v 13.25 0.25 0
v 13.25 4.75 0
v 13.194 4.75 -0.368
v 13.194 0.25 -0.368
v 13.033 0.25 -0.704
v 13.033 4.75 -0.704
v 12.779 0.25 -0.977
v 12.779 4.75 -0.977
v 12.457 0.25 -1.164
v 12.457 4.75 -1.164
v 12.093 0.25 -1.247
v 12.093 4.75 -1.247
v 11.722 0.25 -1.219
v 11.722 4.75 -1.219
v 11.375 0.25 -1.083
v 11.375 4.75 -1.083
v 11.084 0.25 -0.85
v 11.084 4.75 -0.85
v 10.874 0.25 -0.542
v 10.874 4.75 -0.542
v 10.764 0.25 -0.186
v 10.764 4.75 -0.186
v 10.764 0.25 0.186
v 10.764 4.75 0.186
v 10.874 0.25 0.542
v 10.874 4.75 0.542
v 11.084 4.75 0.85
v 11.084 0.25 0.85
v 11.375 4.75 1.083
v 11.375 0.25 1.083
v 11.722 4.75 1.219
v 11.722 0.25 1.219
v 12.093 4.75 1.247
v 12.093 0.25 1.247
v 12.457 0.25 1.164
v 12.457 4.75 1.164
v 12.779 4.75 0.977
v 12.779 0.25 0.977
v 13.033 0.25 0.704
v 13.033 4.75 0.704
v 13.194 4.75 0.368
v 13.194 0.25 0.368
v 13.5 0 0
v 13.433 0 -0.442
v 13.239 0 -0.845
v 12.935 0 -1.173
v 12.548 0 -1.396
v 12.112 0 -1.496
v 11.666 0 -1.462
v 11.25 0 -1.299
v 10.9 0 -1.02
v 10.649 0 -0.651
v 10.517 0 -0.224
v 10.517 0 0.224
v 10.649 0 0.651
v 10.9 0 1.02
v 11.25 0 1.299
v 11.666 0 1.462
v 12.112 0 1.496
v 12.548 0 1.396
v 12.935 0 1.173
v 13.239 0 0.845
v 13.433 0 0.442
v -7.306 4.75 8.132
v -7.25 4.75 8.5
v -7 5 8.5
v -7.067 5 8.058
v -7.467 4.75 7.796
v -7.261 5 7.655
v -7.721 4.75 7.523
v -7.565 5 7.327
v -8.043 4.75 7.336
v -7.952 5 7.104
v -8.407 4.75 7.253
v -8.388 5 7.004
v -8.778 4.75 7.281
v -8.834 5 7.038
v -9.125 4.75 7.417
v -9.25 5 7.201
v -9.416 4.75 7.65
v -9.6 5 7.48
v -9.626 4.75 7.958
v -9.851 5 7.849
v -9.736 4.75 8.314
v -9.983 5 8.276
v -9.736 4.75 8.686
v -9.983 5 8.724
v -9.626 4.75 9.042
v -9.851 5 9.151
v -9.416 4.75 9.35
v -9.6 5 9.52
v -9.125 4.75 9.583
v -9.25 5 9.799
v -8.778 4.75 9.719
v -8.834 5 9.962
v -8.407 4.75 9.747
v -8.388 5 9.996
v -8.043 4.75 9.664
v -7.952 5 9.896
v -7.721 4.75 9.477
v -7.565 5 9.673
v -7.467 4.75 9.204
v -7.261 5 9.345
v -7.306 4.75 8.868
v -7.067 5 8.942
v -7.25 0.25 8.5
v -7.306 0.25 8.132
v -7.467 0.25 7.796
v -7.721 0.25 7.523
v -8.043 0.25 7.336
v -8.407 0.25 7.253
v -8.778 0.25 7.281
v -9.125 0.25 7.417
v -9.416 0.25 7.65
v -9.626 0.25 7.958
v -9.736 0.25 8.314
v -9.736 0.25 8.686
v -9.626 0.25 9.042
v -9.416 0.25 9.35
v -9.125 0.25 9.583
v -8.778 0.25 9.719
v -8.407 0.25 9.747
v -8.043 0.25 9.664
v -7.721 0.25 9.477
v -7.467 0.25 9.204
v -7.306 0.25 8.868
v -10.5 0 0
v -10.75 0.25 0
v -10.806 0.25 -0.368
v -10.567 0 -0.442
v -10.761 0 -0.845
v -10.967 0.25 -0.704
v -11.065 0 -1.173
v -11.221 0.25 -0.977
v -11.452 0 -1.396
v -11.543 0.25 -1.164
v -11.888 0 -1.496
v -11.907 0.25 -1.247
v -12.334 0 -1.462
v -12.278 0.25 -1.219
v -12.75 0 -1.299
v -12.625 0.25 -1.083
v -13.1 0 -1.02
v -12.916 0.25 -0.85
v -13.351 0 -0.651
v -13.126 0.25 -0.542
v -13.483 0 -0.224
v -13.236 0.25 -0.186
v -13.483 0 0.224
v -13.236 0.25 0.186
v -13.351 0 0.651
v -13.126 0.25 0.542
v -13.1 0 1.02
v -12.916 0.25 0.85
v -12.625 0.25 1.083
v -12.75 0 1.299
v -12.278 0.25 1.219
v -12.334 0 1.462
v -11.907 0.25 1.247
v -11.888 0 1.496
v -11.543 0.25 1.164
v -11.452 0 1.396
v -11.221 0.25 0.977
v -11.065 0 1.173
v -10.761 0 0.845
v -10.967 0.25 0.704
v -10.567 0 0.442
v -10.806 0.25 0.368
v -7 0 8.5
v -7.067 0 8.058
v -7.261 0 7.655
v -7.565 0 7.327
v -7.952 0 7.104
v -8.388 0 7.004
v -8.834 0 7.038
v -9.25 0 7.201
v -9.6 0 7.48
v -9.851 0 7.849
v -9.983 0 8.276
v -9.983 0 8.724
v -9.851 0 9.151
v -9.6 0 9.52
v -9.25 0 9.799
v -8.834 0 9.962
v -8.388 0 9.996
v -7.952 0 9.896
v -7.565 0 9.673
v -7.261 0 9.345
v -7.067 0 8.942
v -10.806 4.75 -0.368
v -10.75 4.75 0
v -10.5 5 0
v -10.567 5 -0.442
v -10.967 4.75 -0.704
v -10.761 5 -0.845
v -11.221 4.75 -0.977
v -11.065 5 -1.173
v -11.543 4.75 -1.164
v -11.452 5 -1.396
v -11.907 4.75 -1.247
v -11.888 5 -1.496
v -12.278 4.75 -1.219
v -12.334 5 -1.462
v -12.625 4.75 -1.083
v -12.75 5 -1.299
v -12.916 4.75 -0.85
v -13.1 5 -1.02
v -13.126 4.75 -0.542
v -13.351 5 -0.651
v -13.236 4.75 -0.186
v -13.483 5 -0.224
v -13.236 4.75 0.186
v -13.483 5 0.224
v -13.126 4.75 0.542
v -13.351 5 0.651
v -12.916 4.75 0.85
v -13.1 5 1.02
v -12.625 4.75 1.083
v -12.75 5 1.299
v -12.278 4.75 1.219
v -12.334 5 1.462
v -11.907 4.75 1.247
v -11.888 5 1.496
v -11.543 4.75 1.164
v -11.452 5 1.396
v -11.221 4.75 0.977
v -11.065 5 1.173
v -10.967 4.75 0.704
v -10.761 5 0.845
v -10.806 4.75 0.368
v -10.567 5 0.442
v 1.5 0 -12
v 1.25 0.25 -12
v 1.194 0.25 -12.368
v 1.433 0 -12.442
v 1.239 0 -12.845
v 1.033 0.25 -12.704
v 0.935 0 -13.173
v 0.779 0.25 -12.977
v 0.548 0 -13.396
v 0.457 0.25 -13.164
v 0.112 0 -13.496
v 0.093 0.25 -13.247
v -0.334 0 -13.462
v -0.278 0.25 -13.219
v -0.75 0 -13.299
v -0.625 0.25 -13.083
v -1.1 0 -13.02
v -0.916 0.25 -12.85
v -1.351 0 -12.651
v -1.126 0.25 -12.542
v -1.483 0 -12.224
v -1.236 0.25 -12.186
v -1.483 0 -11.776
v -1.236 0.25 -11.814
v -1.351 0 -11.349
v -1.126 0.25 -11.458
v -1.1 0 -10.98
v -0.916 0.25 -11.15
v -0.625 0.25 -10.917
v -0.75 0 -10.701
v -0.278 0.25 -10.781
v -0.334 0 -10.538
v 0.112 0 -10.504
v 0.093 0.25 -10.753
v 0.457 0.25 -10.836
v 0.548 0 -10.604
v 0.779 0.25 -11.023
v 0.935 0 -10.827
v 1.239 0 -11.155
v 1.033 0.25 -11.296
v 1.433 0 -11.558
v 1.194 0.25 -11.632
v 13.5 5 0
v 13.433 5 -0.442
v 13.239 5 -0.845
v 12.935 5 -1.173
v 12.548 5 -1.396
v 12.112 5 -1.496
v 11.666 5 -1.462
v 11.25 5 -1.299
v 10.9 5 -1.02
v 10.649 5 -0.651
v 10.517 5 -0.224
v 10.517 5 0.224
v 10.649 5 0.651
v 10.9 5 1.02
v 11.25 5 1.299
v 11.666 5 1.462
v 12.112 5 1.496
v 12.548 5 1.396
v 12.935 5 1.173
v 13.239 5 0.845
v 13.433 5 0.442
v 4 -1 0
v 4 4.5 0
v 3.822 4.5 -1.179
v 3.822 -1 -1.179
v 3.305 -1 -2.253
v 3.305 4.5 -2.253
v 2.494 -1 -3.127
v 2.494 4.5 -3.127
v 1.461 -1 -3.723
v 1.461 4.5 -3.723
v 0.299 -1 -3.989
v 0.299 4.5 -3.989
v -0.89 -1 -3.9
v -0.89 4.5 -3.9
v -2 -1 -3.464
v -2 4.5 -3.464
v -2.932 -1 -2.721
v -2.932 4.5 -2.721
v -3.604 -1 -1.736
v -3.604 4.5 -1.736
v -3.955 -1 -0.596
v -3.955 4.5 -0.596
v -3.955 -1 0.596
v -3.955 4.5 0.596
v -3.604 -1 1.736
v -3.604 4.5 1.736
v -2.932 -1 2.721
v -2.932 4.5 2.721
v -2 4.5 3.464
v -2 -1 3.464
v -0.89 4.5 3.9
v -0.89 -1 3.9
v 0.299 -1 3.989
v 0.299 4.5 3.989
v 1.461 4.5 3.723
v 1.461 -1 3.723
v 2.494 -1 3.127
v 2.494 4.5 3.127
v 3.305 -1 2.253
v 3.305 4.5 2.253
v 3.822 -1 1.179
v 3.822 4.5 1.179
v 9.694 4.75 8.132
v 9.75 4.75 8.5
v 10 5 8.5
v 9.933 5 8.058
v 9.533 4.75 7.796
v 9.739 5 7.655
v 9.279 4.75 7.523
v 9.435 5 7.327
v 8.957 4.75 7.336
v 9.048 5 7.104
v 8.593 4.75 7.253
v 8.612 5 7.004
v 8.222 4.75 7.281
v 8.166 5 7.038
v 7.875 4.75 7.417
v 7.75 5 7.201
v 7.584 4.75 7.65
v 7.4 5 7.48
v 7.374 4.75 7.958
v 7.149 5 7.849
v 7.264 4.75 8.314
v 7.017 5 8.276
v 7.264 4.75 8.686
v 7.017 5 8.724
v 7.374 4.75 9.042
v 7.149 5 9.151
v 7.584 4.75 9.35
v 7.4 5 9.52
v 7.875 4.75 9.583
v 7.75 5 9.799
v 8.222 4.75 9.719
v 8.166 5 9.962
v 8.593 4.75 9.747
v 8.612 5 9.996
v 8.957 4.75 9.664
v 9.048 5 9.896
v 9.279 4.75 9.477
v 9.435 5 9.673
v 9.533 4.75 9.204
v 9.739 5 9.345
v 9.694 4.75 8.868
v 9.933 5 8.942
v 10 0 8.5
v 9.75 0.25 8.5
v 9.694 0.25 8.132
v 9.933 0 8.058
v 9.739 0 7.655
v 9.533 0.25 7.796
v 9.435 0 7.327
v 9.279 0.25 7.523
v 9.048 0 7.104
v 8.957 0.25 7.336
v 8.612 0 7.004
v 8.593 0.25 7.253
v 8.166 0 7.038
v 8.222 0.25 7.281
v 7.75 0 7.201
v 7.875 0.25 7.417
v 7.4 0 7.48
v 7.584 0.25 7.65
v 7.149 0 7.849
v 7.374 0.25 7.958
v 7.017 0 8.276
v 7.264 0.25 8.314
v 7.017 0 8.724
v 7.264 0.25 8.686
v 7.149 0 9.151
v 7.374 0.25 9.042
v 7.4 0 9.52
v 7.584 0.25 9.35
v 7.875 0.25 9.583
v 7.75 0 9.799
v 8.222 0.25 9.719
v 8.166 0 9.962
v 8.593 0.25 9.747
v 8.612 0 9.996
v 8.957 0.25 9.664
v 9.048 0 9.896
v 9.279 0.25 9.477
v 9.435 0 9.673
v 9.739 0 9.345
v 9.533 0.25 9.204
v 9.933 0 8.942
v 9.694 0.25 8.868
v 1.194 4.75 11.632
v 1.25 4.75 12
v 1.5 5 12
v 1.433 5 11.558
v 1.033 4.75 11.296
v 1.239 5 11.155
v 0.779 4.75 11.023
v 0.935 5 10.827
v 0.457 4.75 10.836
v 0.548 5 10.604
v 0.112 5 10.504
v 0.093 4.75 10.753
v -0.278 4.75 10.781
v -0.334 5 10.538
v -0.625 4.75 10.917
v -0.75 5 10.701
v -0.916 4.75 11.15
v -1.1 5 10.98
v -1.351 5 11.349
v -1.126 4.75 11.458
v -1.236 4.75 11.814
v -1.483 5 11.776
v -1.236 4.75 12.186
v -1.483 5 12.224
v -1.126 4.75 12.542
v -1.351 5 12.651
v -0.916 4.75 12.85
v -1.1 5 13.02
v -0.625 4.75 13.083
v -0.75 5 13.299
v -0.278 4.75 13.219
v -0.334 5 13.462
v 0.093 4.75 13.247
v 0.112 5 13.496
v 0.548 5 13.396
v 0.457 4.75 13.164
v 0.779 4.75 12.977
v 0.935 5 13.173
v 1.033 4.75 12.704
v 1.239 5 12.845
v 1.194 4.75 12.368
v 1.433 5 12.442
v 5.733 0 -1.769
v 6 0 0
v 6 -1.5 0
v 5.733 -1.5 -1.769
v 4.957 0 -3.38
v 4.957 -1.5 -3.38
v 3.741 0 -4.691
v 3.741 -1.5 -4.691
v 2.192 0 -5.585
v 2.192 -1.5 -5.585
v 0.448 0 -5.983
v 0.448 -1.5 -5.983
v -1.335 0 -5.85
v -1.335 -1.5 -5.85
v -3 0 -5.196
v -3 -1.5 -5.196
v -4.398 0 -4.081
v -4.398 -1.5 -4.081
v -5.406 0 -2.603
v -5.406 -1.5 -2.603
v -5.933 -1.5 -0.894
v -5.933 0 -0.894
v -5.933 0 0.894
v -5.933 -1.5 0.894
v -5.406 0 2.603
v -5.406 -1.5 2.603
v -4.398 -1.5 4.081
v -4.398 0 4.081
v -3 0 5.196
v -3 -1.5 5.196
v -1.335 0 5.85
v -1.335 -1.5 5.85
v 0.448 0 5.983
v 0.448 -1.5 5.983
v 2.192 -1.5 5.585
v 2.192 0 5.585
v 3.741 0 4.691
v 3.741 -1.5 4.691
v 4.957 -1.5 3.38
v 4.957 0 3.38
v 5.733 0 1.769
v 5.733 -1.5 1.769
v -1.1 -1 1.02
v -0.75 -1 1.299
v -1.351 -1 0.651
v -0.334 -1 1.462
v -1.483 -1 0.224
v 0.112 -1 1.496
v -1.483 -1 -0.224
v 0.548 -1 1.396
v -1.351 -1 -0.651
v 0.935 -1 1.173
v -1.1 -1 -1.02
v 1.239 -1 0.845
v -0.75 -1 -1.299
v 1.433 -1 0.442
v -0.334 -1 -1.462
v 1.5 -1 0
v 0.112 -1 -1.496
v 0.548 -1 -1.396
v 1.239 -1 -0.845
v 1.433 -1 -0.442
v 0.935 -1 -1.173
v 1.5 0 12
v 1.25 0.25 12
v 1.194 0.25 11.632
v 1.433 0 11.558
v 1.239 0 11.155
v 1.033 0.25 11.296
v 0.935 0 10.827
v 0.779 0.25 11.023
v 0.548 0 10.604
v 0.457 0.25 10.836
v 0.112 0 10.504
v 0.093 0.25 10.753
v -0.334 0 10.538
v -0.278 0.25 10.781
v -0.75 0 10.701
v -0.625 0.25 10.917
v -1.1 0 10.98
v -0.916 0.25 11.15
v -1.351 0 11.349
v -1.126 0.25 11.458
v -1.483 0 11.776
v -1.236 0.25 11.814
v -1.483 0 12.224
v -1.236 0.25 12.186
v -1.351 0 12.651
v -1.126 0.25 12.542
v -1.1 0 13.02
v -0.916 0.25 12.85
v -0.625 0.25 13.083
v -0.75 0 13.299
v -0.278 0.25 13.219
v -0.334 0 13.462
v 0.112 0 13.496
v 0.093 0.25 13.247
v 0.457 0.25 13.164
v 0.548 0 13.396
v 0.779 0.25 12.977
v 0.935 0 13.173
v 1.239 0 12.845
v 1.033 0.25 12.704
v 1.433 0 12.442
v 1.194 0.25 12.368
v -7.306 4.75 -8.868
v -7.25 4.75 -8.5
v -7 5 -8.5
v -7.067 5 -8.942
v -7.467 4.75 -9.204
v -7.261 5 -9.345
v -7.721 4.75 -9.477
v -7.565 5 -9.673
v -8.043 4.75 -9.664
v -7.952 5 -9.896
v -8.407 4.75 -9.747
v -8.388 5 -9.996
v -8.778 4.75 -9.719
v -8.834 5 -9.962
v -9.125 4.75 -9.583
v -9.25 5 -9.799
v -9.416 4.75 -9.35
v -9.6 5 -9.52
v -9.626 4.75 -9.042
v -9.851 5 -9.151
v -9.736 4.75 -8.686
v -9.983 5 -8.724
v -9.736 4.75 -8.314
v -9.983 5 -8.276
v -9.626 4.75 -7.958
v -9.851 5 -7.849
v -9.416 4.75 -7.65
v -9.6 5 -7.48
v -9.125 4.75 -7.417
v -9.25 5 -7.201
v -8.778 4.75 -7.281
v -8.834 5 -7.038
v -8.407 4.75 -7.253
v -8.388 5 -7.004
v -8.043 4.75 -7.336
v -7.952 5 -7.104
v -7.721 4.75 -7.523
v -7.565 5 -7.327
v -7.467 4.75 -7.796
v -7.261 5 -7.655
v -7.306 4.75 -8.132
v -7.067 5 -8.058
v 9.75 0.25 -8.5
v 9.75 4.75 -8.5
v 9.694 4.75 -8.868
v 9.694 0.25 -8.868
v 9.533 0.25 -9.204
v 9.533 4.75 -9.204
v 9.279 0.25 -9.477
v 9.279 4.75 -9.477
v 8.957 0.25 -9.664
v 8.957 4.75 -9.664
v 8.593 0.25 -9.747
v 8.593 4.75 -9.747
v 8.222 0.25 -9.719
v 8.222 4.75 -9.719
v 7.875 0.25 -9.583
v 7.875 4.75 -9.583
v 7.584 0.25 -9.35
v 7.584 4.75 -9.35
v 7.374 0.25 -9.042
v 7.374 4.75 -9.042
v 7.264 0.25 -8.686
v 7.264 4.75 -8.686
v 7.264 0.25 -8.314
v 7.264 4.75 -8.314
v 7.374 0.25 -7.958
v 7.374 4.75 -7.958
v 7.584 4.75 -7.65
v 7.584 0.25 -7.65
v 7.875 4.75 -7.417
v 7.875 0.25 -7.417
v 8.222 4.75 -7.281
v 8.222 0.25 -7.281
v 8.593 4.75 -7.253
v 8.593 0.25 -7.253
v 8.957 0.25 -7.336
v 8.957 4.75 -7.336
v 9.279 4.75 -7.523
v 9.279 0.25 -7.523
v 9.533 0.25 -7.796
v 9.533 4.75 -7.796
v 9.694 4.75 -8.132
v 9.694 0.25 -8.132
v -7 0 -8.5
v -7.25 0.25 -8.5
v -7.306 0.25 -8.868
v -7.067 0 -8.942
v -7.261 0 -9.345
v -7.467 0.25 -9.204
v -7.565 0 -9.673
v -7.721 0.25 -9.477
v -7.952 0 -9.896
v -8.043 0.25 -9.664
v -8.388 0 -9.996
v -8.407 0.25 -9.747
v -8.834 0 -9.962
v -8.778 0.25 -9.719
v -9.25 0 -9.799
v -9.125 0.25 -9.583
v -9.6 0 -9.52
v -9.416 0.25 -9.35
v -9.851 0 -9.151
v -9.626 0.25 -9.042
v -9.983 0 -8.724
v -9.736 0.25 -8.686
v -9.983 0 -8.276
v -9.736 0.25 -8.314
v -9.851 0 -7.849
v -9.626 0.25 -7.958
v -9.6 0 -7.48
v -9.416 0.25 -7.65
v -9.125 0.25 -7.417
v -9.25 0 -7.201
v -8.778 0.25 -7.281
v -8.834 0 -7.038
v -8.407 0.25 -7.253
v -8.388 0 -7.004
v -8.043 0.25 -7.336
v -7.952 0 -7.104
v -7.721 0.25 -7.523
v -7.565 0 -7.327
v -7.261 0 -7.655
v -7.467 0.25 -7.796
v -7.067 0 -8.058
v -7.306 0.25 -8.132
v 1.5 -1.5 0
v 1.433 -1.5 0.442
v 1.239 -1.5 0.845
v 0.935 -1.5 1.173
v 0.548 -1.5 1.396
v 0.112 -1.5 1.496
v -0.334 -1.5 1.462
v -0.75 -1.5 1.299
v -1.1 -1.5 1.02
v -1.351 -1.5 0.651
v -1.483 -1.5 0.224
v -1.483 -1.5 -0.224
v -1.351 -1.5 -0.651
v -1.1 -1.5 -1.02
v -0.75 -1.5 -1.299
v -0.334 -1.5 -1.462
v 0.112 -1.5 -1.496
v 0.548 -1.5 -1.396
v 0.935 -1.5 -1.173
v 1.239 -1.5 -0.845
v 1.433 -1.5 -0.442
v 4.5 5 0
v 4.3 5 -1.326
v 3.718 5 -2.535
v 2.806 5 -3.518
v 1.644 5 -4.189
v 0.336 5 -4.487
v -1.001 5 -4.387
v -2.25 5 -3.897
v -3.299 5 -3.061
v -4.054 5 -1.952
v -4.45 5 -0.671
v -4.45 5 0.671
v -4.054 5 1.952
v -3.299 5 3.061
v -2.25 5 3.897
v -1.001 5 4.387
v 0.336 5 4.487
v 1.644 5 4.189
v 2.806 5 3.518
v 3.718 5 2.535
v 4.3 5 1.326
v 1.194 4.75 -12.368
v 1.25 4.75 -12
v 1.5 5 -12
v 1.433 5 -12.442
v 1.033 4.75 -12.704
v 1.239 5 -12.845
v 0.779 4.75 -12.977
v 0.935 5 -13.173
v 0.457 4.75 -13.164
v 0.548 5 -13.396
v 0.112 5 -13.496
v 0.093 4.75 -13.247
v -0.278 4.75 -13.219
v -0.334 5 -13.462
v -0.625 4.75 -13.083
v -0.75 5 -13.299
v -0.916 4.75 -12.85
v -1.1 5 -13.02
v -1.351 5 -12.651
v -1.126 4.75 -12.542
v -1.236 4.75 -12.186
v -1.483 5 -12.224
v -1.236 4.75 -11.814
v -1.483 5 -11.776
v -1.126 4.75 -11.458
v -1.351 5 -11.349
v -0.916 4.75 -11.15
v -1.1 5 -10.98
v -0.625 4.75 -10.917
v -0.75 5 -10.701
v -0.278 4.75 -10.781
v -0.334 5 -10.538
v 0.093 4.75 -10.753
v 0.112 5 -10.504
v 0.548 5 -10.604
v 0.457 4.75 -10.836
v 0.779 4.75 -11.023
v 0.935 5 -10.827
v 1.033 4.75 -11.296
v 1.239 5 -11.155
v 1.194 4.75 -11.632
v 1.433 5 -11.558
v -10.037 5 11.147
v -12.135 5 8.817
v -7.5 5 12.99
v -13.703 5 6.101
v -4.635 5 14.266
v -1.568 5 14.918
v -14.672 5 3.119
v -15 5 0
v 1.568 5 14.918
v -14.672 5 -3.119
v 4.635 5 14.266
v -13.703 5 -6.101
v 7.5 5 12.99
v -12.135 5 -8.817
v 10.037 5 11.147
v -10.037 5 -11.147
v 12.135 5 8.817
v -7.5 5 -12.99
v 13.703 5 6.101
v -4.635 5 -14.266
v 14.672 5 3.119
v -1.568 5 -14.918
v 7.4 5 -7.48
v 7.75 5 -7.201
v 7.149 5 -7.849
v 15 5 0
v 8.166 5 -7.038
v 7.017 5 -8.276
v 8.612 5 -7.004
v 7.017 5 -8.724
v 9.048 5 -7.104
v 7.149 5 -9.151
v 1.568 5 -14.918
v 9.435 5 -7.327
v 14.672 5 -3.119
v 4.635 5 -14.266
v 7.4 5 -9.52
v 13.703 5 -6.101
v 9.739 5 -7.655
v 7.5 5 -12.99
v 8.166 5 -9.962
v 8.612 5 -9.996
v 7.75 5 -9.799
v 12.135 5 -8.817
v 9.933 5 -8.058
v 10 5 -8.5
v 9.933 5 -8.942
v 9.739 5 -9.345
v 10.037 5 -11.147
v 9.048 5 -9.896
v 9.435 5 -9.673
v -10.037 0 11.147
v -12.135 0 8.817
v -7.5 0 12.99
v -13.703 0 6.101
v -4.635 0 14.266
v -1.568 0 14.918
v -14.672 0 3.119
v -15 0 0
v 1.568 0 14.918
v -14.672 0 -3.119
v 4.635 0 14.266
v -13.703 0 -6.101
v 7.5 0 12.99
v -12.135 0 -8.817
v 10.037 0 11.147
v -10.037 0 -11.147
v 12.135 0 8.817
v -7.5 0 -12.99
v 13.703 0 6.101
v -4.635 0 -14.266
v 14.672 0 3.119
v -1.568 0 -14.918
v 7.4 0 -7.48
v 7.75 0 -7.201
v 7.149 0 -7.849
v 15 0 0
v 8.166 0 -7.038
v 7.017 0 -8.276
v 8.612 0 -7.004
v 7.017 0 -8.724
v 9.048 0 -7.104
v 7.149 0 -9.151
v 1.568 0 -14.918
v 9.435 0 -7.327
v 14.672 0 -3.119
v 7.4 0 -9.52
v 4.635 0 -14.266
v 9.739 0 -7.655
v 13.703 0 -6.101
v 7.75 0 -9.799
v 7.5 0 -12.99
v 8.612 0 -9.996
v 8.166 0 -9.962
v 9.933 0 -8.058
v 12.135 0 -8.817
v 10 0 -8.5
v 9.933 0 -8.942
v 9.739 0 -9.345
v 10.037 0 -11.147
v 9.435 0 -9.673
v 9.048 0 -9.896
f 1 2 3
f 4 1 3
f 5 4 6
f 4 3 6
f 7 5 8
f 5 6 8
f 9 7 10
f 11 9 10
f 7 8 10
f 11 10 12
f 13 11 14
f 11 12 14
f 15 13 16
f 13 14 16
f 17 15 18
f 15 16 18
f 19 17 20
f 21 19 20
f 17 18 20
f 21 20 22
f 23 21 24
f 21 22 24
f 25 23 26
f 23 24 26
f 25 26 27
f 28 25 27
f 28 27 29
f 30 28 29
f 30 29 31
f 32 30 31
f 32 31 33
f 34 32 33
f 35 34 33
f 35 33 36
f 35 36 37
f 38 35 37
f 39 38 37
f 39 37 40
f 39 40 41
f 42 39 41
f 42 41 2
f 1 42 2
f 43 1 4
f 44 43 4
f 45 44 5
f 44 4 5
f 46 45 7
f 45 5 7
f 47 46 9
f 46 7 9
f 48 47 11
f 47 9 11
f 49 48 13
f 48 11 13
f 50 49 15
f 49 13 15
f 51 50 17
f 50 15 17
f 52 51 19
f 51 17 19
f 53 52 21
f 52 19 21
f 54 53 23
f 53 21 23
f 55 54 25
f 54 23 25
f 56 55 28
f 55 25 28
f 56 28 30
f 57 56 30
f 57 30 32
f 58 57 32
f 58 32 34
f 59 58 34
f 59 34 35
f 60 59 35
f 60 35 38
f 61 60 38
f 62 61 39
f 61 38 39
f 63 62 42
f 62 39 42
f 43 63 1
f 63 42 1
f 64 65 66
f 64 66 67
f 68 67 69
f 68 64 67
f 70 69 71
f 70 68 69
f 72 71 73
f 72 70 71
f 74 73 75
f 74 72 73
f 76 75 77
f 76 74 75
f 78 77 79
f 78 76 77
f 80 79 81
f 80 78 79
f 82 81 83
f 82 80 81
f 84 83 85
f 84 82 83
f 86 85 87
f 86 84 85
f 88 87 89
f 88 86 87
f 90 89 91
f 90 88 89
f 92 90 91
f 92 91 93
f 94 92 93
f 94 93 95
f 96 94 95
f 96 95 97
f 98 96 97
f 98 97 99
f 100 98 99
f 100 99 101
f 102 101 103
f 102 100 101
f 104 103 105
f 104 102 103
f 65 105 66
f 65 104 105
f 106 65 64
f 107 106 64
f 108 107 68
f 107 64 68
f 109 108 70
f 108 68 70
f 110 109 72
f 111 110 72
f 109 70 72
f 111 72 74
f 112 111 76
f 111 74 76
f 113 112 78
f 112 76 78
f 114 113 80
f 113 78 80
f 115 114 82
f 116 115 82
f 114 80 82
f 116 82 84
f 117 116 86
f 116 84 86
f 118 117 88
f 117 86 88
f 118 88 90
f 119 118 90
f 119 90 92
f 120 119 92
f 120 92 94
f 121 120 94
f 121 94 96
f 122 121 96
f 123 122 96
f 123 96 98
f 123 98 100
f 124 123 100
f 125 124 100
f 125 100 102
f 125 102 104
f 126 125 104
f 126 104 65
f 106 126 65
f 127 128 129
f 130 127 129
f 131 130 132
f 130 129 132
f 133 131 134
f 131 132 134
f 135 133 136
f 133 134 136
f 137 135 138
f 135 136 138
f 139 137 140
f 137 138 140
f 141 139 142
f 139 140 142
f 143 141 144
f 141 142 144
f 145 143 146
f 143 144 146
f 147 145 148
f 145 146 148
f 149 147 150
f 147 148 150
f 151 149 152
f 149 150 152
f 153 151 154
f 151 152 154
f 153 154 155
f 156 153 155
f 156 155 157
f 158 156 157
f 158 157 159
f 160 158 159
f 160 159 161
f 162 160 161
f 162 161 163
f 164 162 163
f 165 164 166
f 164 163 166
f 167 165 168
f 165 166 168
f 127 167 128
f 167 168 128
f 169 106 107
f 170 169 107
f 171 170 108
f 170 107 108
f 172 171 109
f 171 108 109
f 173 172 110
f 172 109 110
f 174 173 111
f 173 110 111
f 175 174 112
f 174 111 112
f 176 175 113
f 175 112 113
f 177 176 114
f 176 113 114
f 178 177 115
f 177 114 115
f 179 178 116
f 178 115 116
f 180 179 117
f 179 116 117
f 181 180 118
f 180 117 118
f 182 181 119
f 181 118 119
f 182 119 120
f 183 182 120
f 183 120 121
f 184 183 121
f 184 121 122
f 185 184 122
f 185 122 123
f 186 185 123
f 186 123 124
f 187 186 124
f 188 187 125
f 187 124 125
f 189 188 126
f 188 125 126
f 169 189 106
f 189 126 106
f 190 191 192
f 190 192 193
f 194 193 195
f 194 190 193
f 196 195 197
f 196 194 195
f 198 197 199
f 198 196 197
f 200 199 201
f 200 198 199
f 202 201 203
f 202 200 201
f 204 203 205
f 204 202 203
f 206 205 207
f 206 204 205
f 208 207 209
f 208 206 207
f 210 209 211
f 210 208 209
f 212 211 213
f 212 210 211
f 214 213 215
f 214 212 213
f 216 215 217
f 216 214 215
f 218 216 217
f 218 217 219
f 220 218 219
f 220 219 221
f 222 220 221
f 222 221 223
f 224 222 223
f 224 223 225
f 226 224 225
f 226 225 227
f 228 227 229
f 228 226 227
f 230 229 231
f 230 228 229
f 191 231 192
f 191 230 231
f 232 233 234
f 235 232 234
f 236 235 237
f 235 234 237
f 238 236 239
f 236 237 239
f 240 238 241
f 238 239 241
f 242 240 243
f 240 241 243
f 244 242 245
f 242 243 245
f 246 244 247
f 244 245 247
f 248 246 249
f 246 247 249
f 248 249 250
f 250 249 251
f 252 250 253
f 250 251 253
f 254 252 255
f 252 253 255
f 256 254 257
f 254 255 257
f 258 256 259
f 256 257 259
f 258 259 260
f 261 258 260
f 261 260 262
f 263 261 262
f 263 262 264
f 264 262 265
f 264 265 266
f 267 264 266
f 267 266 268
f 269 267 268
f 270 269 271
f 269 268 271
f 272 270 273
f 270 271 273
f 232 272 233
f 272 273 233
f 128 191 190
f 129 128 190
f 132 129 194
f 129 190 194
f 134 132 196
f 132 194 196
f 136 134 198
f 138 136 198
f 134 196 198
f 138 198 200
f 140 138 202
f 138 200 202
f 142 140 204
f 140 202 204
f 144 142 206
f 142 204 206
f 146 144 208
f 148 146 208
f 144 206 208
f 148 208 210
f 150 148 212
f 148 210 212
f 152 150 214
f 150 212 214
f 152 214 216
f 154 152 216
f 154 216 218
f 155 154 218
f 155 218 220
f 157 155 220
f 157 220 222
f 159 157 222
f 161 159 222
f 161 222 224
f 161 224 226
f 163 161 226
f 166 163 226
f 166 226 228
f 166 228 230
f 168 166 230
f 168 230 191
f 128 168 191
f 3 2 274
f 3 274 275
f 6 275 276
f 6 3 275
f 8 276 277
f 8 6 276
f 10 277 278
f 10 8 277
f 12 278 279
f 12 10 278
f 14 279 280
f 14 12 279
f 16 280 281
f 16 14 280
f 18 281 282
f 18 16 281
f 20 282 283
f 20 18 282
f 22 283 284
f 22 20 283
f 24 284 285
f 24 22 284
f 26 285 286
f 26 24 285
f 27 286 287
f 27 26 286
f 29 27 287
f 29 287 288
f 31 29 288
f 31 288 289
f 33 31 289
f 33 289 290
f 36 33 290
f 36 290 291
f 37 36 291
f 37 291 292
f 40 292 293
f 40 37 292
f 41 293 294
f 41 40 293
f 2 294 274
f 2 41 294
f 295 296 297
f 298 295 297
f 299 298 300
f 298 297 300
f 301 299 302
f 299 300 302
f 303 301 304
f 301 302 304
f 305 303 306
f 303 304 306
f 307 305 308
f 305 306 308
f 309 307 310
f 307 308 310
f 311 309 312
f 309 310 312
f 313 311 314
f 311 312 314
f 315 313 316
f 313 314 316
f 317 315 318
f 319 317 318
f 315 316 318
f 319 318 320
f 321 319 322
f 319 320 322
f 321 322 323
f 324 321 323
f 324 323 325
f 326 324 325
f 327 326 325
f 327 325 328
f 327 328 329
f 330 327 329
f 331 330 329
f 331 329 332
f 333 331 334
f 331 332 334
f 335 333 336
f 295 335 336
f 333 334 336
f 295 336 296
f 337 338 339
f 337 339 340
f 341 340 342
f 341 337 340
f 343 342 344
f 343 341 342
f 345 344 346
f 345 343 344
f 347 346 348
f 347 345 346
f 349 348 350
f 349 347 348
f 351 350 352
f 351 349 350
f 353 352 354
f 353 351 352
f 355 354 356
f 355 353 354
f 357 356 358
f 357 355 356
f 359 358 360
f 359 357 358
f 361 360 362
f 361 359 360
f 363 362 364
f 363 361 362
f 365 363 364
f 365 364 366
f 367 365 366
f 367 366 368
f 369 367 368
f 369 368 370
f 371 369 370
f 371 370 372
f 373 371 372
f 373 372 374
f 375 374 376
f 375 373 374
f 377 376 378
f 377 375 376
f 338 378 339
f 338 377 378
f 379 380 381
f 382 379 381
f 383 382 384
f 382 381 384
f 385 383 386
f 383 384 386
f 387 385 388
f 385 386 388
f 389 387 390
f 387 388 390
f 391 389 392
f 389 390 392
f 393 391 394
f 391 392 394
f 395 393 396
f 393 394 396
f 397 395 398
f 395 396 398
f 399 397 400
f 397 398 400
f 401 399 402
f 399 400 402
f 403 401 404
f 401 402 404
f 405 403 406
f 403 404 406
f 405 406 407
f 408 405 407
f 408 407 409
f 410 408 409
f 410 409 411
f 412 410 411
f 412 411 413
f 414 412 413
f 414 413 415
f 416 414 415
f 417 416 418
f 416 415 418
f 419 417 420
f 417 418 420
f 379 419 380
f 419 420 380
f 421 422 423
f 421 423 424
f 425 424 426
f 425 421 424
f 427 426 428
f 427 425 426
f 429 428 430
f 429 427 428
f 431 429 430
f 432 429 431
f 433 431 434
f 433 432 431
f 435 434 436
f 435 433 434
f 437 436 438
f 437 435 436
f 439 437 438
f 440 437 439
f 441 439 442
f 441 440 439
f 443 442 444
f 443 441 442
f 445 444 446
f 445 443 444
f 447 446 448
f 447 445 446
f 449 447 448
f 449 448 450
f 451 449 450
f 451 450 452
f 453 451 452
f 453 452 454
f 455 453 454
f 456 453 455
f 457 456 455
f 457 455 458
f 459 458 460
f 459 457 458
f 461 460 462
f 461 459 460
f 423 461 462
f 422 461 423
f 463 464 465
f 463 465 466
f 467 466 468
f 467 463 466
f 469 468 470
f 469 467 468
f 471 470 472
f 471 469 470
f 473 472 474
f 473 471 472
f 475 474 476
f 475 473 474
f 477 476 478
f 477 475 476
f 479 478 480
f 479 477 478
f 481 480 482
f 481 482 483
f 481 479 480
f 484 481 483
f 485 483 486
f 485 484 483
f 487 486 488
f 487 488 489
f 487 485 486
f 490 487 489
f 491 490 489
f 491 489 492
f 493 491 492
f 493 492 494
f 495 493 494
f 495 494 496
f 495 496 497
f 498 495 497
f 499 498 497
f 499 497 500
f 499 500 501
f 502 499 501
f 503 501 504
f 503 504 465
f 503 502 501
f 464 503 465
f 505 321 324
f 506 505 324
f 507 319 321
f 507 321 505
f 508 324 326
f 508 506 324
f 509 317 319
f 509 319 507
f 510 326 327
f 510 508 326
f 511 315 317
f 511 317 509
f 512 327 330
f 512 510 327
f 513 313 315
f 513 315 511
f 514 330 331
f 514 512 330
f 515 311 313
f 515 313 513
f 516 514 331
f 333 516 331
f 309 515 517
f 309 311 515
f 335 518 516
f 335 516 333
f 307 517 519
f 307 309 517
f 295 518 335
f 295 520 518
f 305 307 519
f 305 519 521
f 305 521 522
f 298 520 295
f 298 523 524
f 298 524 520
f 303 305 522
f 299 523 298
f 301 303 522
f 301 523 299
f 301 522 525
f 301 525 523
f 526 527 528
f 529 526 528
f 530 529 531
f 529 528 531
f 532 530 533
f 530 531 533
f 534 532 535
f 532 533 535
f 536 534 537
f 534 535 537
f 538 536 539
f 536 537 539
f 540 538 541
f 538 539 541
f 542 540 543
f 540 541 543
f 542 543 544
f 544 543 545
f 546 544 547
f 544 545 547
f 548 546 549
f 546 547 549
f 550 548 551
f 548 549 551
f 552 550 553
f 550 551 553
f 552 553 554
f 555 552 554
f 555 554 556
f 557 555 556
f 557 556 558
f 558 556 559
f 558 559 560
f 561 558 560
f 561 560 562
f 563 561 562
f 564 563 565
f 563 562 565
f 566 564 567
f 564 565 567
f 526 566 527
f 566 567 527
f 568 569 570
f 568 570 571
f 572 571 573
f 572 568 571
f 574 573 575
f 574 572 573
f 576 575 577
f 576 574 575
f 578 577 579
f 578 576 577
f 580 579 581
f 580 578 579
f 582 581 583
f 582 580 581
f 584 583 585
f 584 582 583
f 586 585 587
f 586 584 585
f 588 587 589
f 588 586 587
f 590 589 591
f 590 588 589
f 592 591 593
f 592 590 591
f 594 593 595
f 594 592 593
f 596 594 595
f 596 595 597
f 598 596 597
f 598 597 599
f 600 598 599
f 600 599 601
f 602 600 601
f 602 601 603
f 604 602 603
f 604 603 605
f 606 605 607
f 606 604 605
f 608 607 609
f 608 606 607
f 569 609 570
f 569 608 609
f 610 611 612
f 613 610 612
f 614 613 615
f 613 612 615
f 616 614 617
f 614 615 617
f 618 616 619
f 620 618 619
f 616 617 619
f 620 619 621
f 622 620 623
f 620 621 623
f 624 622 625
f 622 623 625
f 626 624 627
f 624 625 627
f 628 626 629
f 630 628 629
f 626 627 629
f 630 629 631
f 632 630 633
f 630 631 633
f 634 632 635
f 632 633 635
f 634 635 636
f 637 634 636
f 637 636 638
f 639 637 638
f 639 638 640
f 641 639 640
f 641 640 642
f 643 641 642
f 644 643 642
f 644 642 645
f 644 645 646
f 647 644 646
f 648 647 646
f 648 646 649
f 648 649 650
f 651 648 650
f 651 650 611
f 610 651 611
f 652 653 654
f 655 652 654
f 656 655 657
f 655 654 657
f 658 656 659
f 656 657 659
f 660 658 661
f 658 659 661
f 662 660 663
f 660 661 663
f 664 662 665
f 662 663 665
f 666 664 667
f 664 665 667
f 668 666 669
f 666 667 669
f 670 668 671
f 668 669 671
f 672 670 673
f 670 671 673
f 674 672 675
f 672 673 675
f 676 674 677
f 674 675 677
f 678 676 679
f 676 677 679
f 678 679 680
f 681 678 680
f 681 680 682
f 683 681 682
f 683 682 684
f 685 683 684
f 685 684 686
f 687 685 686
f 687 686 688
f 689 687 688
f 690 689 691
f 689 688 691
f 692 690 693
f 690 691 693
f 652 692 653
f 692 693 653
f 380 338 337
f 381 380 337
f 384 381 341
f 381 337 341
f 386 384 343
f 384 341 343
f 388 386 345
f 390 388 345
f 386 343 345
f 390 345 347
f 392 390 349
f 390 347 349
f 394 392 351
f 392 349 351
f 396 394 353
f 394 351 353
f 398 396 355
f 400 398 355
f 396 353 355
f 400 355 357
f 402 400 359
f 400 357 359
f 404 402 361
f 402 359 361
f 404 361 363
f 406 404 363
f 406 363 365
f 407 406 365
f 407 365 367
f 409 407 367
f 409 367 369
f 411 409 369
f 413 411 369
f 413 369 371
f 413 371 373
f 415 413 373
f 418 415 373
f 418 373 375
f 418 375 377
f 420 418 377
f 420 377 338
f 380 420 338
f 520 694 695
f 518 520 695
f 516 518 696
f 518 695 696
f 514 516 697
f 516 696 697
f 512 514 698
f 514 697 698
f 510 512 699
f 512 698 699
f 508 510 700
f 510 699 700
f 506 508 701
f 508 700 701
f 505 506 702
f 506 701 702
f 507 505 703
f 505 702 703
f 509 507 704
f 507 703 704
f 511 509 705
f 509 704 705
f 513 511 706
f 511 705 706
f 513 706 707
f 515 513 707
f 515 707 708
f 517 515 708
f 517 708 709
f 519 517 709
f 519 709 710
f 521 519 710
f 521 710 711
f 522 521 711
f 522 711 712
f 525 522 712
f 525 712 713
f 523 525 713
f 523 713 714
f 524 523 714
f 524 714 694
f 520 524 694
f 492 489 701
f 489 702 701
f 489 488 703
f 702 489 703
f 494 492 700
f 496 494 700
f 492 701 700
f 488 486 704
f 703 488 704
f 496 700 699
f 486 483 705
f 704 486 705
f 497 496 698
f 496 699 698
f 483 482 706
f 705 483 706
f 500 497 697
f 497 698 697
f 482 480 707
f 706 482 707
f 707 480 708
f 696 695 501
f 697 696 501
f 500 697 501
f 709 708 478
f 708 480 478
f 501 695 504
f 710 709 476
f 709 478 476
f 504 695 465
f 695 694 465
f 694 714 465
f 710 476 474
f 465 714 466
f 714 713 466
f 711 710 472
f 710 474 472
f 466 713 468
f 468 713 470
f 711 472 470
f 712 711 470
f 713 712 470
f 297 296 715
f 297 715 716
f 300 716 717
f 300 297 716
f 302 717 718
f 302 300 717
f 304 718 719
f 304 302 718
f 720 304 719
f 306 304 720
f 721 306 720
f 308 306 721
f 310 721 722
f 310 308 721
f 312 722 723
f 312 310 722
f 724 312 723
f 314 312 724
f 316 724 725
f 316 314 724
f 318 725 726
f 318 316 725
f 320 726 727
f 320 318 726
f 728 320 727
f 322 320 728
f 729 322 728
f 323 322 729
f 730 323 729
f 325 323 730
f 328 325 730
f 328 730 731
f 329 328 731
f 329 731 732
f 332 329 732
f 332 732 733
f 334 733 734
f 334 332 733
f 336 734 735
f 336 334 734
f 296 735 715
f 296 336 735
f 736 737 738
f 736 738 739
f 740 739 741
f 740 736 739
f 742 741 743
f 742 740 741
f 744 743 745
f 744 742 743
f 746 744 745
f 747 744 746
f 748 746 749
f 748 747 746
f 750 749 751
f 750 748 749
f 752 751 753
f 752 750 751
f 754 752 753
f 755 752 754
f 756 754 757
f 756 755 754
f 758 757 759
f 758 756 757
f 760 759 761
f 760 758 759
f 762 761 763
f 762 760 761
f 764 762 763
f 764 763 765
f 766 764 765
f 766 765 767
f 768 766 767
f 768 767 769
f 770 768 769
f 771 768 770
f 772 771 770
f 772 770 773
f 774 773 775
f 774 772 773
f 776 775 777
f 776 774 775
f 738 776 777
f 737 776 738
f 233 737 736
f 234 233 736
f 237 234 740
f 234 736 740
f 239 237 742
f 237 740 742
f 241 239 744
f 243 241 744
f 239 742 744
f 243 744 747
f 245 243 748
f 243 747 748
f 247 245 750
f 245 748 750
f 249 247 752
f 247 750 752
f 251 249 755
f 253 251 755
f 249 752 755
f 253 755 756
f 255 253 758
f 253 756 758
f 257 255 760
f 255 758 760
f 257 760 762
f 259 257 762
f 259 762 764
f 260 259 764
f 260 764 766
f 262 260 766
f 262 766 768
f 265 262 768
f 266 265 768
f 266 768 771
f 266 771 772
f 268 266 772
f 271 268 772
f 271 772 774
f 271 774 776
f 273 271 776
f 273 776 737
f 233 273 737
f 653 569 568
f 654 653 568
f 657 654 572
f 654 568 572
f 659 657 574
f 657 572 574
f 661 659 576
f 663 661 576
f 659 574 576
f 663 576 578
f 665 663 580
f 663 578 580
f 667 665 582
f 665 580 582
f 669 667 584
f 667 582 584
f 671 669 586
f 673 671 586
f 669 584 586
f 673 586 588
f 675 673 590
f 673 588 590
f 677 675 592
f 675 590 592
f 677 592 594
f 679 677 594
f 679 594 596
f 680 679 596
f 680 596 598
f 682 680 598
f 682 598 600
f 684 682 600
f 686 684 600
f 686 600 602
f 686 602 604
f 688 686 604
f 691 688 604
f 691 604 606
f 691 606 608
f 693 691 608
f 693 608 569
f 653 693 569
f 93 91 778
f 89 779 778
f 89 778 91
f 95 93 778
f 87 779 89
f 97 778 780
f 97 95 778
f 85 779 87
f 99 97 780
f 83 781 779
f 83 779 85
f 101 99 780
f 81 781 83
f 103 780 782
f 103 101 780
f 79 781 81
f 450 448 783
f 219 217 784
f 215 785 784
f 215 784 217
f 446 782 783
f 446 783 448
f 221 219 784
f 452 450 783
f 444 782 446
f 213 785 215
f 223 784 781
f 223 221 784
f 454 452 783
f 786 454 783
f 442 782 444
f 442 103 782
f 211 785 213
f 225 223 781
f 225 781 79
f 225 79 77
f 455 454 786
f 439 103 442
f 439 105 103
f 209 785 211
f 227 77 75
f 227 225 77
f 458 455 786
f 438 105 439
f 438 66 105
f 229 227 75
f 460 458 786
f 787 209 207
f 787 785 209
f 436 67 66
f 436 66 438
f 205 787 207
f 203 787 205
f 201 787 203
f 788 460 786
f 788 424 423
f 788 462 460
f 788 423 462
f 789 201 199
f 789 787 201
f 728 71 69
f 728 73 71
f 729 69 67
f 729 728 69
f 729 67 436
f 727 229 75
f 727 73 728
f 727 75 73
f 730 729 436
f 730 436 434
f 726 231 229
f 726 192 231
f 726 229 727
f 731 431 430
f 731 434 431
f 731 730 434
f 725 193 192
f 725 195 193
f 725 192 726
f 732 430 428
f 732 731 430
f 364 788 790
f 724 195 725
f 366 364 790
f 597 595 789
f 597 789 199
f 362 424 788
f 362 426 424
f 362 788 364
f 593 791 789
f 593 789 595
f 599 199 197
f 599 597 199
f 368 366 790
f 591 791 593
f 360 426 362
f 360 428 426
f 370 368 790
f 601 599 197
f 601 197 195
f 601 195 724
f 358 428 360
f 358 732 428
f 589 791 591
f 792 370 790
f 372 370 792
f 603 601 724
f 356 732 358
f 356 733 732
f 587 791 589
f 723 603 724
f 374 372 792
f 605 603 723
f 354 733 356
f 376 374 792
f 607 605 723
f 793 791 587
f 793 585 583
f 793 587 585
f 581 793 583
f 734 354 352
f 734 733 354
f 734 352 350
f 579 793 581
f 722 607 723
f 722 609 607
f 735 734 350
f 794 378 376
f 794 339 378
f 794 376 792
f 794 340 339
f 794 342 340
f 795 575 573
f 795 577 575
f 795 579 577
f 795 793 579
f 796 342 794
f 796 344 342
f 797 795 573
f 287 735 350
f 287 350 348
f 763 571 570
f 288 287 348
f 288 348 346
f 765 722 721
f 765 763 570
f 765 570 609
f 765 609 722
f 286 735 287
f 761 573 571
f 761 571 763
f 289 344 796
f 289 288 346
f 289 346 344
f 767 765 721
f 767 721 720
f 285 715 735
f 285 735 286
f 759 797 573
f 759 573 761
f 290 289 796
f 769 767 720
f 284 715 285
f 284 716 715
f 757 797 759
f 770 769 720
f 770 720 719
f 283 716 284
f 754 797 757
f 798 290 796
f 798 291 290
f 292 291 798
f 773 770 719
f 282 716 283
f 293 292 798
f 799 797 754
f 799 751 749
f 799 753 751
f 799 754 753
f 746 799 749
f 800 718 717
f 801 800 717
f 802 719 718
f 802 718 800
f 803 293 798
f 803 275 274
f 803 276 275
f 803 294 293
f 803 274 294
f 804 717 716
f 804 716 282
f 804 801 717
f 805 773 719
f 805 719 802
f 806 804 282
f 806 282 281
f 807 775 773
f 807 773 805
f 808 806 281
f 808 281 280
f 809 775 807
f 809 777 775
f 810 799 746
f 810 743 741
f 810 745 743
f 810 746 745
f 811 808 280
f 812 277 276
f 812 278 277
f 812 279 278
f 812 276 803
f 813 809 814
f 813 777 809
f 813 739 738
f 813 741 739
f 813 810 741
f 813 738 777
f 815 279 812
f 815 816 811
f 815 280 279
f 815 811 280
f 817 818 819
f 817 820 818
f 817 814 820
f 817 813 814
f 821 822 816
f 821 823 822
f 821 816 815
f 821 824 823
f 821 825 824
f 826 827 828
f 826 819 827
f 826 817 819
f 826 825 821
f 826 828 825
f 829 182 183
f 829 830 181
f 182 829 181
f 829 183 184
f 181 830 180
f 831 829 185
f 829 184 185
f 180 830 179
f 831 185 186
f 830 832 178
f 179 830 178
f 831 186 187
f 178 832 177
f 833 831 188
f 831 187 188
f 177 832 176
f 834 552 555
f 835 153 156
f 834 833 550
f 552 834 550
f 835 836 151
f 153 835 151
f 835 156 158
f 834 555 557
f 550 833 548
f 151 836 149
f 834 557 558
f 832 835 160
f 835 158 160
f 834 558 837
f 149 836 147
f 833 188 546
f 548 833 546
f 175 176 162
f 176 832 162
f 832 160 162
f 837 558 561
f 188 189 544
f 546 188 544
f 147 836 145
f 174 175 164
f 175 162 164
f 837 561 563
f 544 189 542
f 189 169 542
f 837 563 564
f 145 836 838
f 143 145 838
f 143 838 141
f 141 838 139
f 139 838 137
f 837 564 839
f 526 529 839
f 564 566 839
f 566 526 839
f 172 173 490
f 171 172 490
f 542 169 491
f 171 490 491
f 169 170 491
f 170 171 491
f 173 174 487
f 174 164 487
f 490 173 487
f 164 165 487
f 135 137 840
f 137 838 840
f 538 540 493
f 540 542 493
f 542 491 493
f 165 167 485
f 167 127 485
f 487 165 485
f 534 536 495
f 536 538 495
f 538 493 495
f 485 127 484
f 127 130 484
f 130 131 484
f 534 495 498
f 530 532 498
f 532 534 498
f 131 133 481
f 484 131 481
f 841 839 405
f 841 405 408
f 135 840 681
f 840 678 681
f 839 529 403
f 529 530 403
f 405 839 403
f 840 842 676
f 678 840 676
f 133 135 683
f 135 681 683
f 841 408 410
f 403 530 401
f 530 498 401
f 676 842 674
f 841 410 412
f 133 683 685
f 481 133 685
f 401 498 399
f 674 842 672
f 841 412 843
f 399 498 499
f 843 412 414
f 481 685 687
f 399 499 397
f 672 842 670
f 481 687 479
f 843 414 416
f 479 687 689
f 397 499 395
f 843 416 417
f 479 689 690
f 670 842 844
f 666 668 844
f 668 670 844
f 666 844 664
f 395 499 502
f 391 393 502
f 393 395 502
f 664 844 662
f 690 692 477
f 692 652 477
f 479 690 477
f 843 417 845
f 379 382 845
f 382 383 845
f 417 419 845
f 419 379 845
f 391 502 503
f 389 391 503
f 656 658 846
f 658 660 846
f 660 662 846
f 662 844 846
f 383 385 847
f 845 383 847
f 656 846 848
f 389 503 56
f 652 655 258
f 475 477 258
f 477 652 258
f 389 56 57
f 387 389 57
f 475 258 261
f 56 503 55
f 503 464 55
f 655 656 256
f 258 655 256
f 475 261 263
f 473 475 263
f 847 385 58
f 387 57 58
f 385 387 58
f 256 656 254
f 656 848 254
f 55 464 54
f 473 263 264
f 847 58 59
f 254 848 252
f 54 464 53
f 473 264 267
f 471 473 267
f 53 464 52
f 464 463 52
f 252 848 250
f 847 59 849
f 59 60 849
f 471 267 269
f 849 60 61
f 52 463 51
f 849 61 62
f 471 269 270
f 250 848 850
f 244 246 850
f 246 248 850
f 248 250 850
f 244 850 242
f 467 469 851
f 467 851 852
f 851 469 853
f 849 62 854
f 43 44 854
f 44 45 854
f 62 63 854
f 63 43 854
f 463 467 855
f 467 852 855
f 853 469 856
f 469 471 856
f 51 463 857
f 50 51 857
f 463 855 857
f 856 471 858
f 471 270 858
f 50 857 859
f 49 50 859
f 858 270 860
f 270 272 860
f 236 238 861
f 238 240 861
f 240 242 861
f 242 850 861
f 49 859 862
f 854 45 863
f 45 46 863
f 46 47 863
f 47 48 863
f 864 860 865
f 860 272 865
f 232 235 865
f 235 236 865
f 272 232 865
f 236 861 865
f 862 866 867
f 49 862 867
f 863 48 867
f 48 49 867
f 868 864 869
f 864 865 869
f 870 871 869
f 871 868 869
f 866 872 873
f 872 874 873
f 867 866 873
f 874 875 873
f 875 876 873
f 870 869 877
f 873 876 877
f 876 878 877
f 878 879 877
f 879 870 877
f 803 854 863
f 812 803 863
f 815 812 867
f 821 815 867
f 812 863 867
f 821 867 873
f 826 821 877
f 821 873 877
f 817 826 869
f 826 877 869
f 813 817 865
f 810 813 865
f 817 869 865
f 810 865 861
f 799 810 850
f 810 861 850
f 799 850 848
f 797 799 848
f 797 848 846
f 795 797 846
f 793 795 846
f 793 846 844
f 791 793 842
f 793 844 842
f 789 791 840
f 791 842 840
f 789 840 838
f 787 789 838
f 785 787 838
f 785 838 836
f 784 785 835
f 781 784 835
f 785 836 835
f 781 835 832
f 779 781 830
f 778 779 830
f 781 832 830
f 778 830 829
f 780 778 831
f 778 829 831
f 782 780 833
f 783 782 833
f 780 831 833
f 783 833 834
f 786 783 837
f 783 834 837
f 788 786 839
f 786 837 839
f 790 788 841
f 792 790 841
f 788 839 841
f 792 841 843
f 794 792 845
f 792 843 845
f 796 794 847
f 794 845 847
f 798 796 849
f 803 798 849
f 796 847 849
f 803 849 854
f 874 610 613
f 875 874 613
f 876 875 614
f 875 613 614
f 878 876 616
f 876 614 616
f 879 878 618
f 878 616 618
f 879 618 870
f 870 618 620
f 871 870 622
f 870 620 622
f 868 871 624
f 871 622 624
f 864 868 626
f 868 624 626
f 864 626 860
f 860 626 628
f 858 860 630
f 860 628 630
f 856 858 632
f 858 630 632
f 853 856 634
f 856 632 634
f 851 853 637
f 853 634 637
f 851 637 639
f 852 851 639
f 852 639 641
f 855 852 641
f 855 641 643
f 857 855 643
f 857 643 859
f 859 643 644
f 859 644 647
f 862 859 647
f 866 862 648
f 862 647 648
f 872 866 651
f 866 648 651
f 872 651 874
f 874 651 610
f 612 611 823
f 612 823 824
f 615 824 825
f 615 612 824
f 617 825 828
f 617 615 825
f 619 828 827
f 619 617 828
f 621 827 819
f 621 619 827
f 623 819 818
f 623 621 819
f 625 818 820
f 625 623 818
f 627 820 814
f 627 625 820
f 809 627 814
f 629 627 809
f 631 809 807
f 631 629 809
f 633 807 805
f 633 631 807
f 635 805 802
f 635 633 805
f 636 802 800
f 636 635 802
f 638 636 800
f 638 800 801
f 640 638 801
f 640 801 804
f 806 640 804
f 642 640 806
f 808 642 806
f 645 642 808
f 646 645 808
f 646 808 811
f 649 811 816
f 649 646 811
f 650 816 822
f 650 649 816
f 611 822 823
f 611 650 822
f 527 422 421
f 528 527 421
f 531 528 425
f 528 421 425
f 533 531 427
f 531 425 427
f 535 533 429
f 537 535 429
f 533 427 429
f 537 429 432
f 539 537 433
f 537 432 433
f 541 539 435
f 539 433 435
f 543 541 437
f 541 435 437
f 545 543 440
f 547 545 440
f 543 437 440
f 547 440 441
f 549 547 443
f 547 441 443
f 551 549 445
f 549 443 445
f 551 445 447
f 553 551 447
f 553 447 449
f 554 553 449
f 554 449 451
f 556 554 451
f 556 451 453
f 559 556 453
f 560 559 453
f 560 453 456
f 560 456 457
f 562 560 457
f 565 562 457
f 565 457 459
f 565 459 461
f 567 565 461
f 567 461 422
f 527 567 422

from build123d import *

# Parameters (mm, degrees)
SKETCH1_R           = 15
BOSS_EXTRUDE1_DEPTH = 5
SKETCH2_R           = 1.25
CUT_EXTRUDE1_DEPTH  = 6
SKETCH3_R           = 6
BOSS_EXTRUDE2_DEPTH = 1.5
SKETCH4_R           = 1.5
CUT_EXTRUDE2_DEPTH  = 1.5
CHAMFER5_SIZE       = 0.25
SKETCH5_R           = 4
CUT_EXTRUDE3_DEPTH  = 6
CHAMFER7_SIZE       = 0.5


with BuildPart() as part:
    # Sketch1 → Boss-Extrude1 (new body)
    with BuildSketch(Plane(origin=(0, 0, 0), x_dir=(1, 0, 0), z_dir=(0, 1, 0))):
        Circle(SKETCH1_R)
    extrude(amount=BOSS_EXTRUDE1_DEPTH)

    # Sketch2 → Cut-Extrude1 (cut, through all)
    with BuildSketch(Plane(origin=(0, 5, 0), x_dir=(1, 0, 0), z_dir=(0, 1, 0))):
        with Locations((0, 12)):
            Circle(SKETCH2_R)
        with Locations((-12, 0)):
            Circle(SKETCH2_R)
        with Locations((0, -12)):
            Circle(SKETCH2_R)
        with Locations((12, 0)):
            Circle(SKETCH2_R)
        with Locations((-8.5, 8.5)):
            Circle(SKETCH2_R)
        with Locations((-8.5, -8.5)):
            Circle(SKETCH2_R)
        with Locations((8.5, 8.5)):
            Circle(SKETCH2_R)
        with Locations((8.5, -8.5)):
            Circle(SKETCH2_R)
    extrude(amount=-CUT_EXTRUDE1_DEPTH, mode=Mode.SUBTRACT)

    # Sketch3 → Boss-Extrude2 (add)
    with BuildSketch(Plane(origin=(0, 0, 0), x_dir=(1, 0, 0), z_dir=(0, 1, 0))):
        Circle(SKETCH3_R)
    extrude(amount=-BOSS_EXTRUDE2_DEPTH)

    # Sketch4 → Cut-Extrude2 (cut)
    with BuildSketch(Plane.XZ.offset(1.5)):
        Circle(SKETCH4_R)
    extrude(amount=-CUT_EXTRUDE2_DEPTH, mode=Mode.SUBTRACT)

    # Chamfer5
    chamfer5_edges = [part.edges().sort_by_distance(p)[0] for p in [
        (-1.25, 0, -12),
        (-1.25, 5, -12),
        (7.25, 0, 8.5),
        (7.25, 5, 8.5),
        (7.25, 0, -8.5),
        (7.25, 5, -8.5),
        (-9.75, 0, -8.5),
        (-9.75, 5, -8.5),
        (-13.25, 0, 0),
        (-13.25, 5, 0),
        (-1.25, 0, 12),
        (-1.25, 5, 12),
        (10.75, 0, 0),
        (10.75, 5, 0),
        (-9.75, 0, 8.5),
        (-9.75, 5, 8.5),
    ]]
    chamfer(chamfer5_edges, length=CHAMFER5_SIZE)

    # Sketch5 → Cut-Extrude3 (cut)
    with BuildSketch(Plane(origin=(0, 5, 0), x_dir=(1, 0, 0), z_dir=(0, 1, 0))):
        Circle(SKETCH5_R)
    extrude(amount=-CUT_EXTRUDE3_DEPTH, mode=Mode.SUBTRACT)

    # Chamfer7
    chamfer7_edges = [part.edges().sort_by_distance(p)[0] for p in [
        (-4, 5, 0),
    ]]
    chamfer(chamfer7_edges, length=CHAMFER7_SIZE)


solid = part.part
